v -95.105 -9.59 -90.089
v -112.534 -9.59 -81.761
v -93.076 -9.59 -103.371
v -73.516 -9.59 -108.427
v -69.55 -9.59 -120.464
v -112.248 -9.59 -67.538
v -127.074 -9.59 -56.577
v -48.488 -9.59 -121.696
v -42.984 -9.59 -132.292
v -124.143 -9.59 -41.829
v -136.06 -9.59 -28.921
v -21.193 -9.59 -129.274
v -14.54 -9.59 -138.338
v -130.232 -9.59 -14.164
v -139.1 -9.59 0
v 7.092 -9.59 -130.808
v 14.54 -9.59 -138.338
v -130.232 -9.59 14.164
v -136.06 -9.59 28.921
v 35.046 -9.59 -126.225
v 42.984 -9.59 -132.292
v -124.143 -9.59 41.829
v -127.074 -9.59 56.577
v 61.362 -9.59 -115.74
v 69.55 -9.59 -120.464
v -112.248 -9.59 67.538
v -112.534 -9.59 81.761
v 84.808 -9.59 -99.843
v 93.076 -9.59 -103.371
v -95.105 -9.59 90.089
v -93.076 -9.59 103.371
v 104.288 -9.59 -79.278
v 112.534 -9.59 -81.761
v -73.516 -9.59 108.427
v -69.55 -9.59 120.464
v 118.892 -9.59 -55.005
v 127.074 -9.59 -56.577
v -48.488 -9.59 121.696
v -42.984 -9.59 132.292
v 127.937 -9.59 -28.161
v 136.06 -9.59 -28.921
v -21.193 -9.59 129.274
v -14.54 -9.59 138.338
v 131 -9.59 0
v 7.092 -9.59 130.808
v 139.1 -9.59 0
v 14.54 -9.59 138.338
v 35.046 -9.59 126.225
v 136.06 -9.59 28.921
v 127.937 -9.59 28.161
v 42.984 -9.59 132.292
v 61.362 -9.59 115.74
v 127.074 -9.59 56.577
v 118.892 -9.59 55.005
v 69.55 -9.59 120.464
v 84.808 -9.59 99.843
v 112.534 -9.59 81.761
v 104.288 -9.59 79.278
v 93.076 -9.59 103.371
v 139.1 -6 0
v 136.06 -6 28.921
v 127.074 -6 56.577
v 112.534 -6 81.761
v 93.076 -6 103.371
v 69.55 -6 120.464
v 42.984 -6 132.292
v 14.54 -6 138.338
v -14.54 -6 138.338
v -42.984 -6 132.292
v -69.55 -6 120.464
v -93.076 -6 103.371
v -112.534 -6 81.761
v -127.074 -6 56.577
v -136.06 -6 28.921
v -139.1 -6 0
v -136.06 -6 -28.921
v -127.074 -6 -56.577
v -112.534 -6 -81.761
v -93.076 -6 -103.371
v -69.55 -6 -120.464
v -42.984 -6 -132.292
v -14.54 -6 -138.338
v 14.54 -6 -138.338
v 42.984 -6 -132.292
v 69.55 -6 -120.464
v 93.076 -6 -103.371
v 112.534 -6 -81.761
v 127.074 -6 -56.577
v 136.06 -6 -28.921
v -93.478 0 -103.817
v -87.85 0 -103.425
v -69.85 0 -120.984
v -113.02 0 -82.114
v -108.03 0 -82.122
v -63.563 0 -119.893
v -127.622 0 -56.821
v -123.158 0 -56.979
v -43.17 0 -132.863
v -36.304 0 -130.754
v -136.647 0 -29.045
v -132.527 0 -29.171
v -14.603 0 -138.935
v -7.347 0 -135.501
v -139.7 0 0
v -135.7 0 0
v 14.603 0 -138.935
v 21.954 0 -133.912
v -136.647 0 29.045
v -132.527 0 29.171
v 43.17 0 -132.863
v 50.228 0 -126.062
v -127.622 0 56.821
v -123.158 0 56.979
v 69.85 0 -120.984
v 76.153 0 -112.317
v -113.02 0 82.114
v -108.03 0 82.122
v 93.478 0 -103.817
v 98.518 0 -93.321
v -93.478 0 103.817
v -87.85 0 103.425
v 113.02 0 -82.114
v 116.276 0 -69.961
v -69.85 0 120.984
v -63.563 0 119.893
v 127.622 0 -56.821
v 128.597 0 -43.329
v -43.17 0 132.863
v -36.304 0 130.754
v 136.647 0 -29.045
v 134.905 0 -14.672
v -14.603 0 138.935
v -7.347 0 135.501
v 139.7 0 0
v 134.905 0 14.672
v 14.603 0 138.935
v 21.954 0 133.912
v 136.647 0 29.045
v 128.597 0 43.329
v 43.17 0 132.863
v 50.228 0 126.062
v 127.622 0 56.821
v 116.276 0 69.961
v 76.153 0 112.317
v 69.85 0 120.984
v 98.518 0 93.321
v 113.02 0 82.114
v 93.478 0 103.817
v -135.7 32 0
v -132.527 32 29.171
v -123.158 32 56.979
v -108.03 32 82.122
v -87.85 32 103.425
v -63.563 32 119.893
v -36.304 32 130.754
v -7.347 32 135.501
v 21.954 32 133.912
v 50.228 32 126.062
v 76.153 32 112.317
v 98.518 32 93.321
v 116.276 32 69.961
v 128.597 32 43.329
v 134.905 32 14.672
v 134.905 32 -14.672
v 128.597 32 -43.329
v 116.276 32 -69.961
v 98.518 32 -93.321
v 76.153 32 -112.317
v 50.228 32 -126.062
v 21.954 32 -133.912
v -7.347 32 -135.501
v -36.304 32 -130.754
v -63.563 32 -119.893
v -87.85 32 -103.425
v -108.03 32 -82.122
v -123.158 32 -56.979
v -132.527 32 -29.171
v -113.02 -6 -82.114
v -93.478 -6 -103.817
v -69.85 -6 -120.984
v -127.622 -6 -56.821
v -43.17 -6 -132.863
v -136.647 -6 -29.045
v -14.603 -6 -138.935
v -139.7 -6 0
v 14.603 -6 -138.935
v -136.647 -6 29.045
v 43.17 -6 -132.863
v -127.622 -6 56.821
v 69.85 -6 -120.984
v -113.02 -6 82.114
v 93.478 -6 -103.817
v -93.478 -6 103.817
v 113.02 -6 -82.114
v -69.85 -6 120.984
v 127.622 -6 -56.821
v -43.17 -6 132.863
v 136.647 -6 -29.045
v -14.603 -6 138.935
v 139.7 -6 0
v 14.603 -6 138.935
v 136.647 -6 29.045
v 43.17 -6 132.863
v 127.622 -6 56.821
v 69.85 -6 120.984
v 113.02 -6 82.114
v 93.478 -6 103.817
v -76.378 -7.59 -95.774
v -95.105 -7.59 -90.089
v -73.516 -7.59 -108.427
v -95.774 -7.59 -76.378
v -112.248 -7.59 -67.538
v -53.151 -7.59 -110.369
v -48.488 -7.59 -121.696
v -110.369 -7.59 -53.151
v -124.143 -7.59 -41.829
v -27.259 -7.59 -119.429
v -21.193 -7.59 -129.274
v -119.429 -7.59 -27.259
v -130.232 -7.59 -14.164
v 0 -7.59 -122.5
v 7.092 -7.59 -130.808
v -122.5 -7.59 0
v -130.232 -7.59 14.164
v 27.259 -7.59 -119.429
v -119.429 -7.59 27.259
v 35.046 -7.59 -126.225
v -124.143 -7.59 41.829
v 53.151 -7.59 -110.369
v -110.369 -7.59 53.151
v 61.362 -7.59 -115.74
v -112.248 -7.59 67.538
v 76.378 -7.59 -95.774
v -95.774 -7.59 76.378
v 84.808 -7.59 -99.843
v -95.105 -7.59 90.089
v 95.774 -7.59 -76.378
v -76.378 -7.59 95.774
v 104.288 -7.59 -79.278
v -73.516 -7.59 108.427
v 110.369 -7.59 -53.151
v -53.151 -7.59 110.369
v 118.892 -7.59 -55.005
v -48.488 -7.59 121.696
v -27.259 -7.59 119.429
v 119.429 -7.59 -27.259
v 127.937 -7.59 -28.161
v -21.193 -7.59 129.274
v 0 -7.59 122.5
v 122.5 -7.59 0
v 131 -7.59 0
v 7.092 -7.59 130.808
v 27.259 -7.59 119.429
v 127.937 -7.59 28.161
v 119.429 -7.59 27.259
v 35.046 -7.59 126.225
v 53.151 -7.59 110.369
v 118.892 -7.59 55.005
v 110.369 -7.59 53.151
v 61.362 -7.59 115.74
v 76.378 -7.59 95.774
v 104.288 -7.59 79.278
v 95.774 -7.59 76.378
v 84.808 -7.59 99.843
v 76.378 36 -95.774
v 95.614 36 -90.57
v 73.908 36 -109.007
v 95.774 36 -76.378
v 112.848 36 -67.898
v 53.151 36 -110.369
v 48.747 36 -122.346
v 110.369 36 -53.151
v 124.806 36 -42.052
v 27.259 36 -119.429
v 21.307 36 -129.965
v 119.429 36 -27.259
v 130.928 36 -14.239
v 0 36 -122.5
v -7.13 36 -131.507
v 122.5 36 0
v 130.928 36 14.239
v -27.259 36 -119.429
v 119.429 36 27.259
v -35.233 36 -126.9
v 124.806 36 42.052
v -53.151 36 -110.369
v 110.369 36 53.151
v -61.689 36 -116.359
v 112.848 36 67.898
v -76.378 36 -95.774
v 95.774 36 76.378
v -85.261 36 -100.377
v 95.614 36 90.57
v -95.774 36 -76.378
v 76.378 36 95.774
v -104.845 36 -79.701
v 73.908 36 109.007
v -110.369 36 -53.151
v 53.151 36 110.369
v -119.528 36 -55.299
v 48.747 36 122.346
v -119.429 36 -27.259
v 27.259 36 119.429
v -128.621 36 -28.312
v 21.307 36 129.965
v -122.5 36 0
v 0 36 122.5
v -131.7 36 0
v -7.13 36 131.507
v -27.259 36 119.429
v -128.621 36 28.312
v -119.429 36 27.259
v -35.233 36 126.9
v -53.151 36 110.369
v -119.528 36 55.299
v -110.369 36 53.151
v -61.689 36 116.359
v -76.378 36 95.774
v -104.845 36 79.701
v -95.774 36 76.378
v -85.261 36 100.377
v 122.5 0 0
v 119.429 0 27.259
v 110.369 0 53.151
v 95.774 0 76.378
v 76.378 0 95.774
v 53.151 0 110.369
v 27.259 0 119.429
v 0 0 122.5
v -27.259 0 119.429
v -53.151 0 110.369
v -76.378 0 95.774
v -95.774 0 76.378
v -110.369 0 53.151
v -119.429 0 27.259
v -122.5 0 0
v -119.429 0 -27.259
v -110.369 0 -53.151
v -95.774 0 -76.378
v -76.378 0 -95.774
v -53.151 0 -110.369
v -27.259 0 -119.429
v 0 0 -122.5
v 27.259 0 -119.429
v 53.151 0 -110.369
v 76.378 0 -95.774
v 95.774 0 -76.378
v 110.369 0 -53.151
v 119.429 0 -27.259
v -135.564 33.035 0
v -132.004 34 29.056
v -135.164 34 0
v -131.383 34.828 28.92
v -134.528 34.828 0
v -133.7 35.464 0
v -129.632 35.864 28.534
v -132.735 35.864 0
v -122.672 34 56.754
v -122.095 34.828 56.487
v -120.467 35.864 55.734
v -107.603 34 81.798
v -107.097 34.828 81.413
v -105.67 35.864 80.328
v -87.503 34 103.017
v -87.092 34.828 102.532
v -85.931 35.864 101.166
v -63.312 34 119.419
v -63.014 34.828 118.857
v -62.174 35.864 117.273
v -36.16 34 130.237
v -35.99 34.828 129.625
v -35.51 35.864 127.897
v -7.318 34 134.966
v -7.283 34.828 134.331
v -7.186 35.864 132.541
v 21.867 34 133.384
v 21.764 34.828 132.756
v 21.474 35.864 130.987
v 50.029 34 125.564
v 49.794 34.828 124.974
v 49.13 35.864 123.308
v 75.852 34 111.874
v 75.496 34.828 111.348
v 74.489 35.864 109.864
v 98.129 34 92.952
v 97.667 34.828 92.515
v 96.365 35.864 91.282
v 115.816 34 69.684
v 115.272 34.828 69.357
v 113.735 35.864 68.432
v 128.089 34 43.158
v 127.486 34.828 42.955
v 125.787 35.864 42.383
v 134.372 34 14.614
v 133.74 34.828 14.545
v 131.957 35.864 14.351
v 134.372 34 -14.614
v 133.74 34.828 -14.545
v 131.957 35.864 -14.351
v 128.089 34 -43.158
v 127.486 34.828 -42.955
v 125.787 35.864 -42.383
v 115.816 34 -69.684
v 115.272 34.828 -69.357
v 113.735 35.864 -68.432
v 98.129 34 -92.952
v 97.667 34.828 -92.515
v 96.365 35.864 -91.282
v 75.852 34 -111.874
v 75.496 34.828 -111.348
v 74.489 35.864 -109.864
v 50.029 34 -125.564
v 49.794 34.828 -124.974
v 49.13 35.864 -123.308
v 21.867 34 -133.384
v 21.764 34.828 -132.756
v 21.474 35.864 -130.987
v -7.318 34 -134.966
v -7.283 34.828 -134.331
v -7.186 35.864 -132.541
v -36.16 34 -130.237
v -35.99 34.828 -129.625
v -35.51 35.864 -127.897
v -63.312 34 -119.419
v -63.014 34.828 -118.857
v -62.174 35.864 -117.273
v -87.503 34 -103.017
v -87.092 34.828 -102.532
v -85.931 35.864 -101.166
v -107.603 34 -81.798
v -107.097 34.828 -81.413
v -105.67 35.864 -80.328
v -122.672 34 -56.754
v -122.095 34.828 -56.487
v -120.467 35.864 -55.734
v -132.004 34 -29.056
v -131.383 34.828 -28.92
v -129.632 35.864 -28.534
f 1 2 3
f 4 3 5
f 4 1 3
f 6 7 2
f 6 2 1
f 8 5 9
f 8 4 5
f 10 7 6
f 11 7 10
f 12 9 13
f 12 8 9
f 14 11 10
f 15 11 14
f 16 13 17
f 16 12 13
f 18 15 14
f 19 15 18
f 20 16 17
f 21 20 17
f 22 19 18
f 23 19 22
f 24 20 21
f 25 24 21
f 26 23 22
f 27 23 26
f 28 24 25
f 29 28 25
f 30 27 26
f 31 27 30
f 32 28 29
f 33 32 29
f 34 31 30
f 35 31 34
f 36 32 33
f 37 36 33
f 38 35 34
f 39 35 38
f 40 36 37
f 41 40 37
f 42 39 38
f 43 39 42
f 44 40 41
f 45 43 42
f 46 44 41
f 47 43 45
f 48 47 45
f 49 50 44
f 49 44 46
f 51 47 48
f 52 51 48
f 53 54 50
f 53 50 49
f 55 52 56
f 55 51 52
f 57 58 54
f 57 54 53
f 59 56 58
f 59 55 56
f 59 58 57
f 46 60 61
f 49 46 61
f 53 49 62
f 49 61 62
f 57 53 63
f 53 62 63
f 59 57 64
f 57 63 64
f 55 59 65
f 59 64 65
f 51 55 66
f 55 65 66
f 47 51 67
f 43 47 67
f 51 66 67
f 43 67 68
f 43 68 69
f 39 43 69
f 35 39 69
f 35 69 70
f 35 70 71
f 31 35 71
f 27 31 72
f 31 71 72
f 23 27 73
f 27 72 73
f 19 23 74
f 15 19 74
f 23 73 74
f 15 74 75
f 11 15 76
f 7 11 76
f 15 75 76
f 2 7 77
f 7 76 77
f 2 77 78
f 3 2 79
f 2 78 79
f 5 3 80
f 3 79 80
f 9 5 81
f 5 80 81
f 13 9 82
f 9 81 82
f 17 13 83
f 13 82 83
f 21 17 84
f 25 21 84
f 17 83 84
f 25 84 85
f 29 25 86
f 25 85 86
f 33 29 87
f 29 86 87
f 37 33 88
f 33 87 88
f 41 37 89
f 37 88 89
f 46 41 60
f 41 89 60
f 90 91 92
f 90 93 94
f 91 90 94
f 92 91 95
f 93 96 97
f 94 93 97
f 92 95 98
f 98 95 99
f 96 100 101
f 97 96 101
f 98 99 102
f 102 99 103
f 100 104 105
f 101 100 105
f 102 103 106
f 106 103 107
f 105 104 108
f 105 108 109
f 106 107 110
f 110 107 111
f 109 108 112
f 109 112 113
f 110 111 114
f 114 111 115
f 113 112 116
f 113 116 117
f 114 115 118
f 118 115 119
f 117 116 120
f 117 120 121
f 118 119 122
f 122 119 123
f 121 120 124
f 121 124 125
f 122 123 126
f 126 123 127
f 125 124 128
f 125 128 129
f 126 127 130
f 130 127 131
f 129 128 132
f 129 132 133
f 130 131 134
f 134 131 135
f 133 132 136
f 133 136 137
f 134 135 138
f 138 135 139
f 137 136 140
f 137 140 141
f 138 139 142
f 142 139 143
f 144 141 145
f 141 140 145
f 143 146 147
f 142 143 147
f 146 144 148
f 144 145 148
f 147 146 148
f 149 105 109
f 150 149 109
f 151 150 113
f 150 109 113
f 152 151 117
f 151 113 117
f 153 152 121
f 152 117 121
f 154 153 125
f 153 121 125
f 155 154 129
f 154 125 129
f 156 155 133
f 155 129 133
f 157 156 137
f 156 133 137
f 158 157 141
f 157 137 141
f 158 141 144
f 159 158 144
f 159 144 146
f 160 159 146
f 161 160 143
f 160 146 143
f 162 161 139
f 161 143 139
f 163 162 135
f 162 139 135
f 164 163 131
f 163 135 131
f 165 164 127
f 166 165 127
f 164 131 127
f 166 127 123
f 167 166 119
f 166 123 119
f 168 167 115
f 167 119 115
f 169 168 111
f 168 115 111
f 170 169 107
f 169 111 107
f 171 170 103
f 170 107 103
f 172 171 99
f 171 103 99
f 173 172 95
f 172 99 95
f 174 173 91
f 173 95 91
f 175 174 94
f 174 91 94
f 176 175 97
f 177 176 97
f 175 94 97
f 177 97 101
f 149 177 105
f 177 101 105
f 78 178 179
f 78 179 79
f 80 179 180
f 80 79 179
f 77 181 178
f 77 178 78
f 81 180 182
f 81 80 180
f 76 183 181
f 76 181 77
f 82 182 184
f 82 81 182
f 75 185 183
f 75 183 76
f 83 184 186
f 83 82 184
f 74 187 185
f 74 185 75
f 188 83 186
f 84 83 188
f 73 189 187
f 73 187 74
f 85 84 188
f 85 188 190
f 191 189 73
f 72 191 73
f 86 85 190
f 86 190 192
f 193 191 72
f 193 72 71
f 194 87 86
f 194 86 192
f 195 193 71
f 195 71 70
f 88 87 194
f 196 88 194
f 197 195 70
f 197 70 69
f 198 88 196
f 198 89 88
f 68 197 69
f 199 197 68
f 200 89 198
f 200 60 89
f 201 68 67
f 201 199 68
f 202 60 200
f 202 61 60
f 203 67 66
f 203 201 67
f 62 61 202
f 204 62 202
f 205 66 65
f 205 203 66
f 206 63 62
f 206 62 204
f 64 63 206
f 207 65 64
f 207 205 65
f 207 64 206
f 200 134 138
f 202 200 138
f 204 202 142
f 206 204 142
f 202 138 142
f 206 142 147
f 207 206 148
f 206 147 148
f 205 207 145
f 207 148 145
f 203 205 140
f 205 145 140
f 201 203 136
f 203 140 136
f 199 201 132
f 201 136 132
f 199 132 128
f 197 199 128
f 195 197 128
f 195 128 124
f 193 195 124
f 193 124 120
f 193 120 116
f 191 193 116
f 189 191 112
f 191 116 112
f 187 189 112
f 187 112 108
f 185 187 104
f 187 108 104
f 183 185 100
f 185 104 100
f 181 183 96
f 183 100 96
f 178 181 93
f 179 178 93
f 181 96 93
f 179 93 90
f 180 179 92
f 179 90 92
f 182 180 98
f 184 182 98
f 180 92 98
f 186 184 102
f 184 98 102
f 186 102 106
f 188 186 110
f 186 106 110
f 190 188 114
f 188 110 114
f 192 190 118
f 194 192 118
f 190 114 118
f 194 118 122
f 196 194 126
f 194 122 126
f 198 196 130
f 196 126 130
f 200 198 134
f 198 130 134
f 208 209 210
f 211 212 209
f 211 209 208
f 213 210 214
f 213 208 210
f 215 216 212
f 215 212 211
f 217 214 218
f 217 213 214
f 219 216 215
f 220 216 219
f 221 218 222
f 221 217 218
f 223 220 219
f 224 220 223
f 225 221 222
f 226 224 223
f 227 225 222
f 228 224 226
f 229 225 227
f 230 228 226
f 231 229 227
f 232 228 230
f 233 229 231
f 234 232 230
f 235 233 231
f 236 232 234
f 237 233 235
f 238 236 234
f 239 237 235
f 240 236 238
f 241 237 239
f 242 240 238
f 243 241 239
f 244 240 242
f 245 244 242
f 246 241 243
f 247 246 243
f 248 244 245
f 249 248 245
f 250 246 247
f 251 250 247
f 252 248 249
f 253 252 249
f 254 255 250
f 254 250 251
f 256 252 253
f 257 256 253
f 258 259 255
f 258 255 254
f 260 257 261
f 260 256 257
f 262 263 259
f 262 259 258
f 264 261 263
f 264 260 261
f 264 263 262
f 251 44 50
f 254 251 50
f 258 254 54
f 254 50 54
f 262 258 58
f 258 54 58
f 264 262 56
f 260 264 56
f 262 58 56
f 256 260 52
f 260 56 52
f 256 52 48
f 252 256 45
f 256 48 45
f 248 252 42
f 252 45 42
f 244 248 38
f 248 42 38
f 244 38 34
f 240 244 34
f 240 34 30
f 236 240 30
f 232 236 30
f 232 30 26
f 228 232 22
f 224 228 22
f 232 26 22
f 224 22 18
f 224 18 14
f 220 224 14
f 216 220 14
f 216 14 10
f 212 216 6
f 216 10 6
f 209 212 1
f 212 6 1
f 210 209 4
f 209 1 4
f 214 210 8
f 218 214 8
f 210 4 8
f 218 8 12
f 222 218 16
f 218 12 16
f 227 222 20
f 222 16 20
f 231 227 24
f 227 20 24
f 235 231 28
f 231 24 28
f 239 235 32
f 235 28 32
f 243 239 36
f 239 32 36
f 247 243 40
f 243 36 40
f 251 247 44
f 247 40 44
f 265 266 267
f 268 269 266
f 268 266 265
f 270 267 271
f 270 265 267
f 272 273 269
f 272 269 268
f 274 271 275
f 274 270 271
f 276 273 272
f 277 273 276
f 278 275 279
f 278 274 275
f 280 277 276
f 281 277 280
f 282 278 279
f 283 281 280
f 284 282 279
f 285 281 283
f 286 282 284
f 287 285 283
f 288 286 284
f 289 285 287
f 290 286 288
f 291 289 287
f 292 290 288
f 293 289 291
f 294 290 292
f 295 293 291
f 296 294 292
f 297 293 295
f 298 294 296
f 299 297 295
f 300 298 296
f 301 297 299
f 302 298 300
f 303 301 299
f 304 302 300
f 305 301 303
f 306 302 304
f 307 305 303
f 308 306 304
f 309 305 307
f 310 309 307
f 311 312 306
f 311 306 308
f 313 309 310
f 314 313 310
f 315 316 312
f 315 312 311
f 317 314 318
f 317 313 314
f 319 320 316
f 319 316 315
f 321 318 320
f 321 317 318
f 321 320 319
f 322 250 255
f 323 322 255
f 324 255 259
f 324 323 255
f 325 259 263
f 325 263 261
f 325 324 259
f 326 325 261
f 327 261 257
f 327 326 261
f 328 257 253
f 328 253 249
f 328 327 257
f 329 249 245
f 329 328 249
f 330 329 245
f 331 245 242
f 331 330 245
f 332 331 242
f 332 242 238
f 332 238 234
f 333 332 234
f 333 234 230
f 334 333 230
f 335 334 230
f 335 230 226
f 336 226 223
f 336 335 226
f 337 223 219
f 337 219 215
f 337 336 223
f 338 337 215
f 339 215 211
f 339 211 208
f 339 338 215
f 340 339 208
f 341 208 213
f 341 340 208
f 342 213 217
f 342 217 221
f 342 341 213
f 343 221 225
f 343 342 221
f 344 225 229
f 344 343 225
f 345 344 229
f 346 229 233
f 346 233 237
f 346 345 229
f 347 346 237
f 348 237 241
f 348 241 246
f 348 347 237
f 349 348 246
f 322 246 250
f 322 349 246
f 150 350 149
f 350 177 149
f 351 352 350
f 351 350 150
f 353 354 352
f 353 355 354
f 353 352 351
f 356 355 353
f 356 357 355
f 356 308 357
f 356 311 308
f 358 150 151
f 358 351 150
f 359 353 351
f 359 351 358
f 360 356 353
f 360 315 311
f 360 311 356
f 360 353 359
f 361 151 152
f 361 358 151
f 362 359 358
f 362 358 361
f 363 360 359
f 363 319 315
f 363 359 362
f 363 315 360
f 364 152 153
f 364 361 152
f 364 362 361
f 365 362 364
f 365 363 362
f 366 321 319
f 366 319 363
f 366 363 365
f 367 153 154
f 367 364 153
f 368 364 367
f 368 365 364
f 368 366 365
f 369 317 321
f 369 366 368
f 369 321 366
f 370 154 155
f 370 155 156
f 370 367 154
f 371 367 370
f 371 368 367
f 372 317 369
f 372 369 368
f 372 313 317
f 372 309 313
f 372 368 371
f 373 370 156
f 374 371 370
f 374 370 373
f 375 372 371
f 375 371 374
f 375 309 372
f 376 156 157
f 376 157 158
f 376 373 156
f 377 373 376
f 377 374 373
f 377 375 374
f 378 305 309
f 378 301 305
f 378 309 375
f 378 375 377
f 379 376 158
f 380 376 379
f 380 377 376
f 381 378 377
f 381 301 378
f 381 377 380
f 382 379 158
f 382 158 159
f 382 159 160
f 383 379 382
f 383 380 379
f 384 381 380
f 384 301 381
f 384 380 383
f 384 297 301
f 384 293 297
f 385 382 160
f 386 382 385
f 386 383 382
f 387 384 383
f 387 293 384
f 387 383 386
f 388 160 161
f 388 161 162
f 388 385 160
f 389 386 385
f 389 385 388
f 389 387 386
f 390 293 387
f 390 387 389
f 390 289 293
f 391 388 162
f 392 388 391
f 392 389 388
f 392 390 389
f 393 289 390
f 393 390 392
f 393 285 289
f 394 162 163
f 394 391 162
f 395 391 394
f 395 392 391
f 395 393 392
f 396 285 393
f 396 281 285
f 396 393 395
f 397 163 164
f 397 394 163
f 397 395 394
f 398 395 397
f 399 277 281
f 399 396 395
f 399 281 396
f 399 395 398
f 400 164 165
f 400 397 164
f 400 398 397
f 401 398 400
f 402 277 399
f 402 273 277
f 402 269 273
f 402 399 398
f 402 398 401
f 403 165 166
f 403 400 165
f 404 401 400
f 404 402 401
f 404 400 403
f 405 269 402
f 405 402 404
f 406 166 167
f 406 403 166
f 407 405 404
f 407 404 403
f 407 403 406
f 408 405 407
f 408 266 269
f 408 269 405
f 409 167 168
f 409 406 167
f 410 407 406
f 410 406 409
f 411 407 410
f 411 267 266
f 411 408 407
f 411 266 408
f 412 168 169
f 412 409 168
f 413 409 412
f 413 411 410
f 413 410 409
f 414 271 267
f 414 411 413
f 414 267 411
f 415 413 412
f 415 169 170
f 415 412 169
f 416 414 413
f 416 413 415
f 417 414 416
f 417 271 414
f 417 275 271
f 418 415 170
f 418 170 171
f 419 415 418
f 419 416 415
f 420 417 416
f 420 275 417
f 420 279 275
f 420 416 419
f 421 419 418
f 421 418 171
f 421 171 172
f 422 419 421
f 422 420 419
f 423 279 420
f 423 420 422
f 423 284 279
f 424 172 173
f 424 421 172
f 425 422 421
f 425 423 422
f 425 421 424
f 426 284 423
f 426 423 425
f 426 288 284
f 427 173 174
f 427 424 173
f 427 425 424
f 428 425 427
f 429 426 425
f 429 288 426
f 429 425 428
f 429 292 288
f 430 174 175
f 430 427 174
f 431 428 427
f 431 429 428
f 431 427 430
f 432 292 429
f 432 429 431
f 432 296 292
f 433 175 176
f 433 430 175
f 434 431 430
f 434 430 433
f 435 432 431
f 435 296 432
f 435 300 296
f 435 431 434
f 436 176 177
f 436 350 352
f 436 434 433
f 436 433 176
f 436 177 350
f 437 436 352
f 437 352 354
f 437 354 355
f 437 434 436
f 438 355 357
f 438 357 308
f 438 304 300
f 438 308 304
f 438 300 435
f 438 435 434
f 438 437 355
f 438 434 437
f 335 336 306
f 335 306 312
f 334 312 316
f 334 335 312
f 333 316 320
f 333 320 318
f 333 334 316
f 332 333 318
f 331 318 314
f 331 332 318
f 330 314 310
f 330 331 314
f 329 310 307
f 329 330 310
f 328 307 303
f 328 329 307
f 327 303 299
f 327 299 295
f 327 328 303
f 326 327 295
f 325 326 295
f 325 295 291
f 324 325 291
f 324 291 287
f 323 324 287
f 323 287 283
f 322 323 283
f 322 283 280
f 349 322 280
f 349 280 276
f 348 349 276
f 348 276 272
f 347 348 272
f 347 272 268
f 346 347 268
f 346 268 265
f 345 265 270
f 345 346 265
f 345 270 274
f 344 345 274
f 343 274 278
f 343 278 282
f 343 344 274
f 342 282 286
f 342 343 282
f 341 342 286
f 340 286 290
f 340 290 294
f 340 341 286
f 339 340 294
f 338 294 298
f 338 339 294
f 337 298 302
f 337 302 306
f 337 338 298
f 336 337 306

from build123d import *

# Parameters (mm, degrees)
F0_R     = 139.7
F0_R_2   = 122.5
F1_DEPTH = 6
F2_R     = 139.1
F2_R_2   = 122.5
F3_DEPTH = 3.59
F4_R     = 135.7
F4_R_2   = 122.5
F5_DEPTH = 36
F6_R     = 131
F6_R_2   = 122.5
F7_DEPTH = 2
F8_R     = 4


with BuildPart() as f1:
    # F0 (on Front) → F1 (new body)
    with BuildSketch(Plane.XZ):
        Circle(F0_R)
        Circle(F0_R_2, mode=Mode.SUBTRACT)
    extrude(amount=F1_DEPTH)

    # F2 (on face) → F3 (join)
    with BuildSketch(Plane.XZ.offset(6)):
        Circle(F2_R)
        Circle(F2_R_2, mode=Mode.SUBTRACT)
    extrude(amount=F3_DEPTH)

    # F4 (on face) → F5 (join)
    with BuildSketch(Plane(origin=(0, 0, 0), x_dir=(-1, 0, 0), z_dir=(0, 1, 0))):
        Circle(F4_R)
        Circle(F4_R_2, mode=Mode.SUBTRACT)
    extrude(amount=F5_DEPTH)

    # F6 (on face) → F7 (cut)
    with BuildSketch(Plane.XZ.offset(9.59)):
        Circle(F6_R)
        Circle(F6_R_2, mode=Mode.SUBTRACT)
    extrude(amount=-F7_DEPTH, mode=Mode.SUBTRACT)

    # F8
    f8_edges = [f1.edges().sort_by_distance(p)[0] for p in [
        (135.7, 36, 0),
    ]]
    fillet(f8_edges, radius=F8_R)


solid = f1.part
